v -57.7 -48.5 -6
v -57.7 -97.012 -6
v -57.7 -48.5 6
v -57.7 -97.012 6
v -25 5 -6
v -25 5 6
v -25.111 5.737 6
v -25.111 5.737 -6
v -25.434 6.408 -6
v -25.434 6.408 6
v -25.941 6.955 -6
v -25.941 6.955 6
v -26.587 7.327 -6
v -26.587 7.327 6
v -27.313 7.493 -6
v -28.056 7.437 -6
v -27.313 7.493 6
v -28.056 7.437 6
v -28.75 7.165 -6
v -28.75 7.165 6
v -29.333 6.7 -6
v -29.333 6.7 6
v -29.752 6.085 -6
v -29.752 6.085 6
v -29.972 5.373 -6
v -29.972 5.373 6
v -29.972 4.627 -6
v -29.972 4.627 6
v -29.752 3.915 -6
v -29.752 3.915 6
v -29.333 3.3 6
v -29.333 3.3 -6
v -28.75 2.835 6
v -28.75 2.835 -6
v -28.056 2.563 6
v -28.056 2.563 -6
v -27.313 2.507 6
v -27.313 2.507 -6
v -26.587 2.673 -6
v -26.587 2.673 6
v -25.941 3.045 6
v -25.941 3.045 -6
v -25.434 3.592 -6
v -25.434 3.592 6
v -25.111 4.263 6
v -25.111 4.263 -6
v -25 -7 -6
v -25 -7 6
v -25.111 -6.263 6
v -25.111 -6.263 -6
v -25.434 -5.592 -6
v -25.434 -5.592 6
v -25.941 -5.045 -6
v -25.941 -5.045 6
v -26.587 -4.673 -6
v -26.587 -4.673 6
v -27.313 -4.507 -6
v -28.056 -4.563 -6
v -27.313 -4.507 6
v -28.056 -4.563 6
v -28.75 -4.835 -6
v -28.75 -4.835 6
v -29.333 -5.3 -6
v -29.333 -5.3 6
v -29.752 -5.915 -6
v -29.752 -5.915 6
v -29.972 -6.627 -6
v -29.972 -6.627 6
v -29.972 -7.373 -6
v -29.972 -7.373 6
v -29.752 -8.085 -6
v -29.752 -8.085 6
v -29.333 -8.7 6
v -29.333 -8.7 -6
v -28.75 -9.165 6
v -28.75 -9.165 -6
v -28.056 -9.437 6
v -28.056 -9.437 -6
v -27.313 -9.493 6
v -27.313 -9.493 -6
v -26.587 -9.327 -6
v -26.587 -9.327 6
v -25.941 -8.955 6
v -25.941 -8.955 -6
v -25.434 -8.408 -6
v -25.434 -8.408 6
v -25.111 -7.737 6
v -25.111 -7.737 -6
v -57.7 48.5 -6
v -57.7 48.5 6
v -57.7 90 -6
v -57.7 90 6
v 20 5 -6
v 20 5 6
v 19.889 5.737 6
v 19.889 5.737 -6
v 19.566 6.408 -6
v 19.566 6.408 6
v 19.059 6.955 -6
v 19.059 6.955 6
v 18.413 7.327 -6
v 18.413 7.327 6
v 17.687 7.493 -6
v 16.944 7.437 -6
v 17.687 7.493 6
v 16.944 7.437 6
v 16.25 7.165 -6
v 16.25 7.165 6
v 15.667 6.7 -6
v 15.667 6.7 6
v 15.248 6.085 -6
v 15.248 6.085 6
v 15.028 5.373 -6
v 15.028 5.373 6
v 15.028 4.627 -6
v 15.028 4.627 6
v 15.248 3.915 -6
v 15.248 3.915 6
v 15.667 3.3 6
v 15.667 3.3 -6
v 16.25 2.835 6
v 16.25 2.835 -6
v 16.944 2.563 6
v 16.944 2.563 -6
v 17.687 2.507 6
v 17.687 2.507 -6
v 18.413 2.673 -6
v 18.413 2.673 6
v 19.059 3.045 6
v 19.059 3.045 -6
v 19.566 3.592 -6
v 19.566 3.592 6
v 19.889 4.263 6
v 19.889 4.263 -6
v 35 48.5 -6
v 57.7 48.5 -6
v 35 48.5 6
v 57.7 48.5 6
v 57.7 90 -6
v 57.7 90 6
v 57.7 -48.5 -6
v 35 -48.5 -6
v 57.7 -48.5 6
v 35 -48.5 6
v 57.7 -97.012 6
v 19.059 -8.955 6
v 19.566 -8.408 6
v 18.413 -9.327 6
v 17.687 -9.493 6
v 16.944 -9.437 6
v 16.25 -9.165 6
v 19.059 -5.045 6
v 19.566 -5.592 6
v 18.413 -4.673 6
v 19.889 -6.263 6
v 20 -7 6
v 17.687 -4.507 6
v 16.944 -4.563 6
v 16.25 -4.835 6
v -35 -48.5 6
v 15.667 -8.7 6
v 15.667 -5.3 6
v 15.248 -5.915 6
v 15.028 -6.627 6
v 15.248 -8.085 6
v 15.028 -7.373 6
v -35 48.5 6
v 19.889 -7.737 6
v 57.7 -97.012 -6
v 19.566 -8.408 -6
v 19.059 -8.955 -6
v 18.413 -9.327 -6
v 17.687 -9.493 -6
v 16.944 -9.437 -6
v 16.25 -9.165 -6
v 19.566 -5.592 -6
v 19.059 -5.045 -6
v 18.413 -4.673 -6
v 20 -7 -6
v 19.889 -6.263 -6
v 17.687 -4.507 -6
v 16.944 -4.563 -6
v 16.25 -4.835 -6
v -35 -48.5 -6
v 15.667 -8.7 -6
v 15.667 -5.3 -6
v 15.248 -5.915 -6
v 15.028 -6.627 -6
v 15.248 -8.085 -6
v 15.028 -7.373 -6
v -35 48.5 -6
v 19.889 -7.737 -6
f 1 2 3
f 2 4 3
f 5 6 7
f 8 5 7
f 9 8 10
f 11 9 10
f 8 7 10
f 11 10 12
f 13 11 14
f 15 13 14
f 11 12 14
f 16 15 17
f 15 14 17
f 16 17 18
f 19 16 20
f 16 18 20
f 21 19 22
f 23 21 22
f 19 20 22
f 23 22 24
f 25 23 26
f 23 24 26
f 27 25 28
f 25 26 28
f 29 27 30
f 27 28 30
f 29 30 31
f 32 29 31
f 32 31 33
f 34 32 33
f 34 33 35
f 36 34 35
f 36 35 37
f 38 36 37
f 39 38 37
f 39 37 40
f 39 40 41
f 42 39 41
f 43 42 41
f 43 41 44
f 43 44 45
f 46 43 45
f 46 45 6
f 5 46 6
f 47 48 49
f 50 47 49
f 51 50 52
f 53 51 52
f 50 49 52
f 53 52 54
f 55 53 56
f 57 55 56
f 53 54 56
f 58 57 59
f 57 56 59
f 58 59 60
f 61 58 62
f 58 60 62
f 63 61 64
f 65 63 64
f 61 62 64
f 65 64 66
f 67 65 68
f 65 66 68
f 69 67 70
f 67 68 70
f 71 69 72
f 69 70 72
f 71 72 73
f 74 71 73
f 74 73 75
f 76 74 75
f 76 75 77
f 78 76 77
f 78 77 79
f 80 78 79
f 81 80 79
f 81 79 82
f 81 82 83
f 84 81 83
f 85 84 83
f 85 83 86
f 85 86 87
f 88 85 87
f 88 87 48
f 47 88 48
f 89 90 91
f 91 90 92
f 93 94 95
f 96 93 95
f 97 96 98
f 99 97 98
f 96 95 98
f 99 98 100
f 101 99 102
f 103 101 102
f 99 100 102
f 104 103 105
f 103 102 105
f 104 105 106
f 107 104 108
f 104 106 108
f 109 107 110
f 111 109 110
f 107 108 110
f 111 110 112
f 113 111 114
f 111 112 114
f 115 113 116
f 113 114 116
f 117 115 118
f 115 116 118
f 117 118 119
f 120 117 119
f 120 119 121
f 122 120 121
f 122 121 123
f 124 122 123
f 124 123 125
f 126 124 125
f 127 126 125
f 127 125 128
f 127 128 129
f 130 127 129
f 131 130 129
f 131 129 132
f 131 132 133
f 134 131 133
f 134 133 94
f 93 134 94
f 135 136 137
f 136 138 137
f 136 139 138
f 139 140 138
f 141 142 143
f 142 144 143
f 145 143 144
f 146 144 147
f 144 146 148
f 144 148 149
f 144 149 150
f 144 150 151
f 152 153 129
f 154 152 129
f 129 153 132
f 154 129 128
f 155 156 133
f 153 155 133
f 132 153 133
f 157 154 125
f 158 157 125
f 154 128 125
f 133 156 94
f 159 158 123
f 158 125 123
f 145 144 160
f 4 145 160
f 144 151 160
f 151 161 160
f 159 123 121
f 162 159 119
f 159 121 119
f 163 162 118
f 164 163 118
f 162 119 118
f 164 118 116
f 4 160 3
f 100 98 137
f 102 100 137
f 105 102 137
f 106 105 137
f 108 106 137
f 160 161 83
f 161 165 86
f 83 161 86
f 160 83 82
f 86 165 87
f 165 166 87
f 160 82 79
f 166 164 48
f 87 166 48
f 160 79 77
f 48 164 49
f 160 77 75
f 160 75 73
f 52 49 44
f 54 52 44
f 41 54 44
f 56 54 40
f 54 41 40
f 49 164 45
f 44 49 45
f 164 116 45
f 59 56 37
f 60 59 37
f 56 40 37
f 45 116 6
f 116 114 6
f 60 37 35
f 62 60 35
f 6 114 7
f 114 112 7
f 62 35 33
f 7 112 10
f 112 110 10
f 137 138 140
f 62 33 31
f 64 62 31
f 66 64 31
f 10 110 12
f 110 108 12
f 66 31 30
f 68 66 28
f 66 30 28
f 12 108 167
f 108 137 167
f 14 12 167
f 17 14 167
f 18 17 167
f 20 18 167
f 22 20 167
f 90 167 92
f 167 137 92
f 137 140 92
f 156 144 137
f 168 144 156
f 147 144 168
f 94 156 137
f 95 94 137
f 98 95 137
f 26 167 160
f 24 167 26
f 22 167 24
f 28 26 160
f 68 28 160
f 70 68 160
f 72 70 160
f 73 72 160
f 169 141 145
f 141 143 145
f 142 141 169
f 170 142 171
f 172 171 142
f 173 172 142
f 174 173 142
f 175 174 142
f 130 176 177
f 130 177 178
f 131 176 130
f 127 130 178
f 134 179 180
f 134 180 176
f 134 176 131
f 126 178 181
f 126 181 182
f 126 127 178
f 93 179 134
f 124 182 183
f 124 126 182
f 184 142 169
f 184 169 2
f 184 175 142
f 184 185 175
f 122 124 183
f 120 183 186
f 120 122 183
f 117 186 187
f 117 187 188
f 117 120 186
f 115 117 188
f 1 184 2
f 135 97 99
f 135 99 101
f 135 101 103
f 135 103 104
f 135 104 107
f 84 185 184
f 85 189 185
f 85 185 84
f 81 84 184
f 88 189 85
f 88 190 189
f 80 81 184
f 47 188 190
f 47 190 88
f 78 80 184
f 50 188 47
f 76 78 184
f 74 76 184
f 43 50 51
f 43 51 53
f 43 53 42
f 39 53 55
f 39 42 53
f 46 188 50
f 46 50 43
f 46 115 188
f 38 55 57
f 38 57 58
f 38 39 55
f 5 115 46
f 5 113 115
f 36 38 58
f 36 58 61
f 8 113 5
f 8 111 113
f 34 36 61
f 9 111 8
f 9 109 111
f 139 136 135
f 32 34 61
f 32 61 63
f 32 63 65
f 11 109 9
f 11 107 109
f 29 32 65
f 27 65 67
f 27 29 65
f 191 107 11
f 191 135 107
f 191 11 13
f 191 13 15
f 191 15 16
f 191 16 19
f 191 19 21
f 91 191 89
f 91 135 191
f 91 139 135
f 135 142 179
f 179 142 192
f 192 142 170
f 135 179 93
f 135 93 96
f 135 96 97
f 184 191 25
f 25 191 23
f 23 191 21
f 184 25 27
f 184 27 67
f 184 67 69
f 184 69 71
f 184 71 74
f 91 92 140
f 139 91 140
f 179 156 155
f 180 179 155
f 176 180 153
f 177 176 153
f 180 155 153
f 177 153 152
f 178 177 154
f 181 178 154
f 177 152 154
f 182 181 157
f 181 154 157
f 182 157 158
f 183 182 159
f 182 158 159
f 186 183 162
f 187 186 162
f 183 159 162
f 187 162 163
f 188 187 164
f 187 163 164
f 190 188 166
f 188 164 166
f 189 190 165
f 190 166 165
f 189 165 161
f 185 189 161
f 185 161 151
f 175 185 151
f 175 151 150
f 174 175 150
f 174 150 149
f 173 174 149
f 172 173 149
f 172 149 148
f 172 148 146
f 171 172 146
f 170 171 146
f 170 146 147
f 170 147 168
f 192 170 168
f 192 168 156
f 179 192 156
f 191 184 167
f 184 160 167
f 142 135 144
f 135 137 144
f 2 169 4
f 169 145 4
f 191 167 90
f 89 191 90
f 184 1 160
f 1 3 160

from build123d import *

# Parameters (mm, degrees)
BOSS_EXTRUDE1_DEPTH         = 6
TAP_DRILL_FOR_M6X1_0_TAP1_D = 5


with BuildPart() as part:
    # Sketch2 → Boss-Extrude1 (new, symmetric)
    with BuildSketch(Plane.XY):
        Polygon((-57.7, 90), (57.7, 90), (57.7, 48.5), (35, 48.5), (35, -48.5), (57.7, -48.5), (57.7, -97.0125), (-57.7, -97.0125), (-57.7, -48.5), (-35, -48.5), (-35, 48.5), (-57.7, 48.5), align=None)
    extrude(amount=BOSS_EXTRUDE1_DEPTH, both=True)

    # Tap Drill for M6x1.0 Tap1 (through all)
    with Locations(Plane(origin=(0, 0, -6), x_dir=(-1, 0, 0), z_dir=(0, 0, -1))):
        with Locations((-17.5, 5), (27.5, 5), (27.5, -7), (-17.5, -7)):
            Hole(TAP_DRILL_FOR_M6X1_0_TAP1_D / 2)


solid = part.part
